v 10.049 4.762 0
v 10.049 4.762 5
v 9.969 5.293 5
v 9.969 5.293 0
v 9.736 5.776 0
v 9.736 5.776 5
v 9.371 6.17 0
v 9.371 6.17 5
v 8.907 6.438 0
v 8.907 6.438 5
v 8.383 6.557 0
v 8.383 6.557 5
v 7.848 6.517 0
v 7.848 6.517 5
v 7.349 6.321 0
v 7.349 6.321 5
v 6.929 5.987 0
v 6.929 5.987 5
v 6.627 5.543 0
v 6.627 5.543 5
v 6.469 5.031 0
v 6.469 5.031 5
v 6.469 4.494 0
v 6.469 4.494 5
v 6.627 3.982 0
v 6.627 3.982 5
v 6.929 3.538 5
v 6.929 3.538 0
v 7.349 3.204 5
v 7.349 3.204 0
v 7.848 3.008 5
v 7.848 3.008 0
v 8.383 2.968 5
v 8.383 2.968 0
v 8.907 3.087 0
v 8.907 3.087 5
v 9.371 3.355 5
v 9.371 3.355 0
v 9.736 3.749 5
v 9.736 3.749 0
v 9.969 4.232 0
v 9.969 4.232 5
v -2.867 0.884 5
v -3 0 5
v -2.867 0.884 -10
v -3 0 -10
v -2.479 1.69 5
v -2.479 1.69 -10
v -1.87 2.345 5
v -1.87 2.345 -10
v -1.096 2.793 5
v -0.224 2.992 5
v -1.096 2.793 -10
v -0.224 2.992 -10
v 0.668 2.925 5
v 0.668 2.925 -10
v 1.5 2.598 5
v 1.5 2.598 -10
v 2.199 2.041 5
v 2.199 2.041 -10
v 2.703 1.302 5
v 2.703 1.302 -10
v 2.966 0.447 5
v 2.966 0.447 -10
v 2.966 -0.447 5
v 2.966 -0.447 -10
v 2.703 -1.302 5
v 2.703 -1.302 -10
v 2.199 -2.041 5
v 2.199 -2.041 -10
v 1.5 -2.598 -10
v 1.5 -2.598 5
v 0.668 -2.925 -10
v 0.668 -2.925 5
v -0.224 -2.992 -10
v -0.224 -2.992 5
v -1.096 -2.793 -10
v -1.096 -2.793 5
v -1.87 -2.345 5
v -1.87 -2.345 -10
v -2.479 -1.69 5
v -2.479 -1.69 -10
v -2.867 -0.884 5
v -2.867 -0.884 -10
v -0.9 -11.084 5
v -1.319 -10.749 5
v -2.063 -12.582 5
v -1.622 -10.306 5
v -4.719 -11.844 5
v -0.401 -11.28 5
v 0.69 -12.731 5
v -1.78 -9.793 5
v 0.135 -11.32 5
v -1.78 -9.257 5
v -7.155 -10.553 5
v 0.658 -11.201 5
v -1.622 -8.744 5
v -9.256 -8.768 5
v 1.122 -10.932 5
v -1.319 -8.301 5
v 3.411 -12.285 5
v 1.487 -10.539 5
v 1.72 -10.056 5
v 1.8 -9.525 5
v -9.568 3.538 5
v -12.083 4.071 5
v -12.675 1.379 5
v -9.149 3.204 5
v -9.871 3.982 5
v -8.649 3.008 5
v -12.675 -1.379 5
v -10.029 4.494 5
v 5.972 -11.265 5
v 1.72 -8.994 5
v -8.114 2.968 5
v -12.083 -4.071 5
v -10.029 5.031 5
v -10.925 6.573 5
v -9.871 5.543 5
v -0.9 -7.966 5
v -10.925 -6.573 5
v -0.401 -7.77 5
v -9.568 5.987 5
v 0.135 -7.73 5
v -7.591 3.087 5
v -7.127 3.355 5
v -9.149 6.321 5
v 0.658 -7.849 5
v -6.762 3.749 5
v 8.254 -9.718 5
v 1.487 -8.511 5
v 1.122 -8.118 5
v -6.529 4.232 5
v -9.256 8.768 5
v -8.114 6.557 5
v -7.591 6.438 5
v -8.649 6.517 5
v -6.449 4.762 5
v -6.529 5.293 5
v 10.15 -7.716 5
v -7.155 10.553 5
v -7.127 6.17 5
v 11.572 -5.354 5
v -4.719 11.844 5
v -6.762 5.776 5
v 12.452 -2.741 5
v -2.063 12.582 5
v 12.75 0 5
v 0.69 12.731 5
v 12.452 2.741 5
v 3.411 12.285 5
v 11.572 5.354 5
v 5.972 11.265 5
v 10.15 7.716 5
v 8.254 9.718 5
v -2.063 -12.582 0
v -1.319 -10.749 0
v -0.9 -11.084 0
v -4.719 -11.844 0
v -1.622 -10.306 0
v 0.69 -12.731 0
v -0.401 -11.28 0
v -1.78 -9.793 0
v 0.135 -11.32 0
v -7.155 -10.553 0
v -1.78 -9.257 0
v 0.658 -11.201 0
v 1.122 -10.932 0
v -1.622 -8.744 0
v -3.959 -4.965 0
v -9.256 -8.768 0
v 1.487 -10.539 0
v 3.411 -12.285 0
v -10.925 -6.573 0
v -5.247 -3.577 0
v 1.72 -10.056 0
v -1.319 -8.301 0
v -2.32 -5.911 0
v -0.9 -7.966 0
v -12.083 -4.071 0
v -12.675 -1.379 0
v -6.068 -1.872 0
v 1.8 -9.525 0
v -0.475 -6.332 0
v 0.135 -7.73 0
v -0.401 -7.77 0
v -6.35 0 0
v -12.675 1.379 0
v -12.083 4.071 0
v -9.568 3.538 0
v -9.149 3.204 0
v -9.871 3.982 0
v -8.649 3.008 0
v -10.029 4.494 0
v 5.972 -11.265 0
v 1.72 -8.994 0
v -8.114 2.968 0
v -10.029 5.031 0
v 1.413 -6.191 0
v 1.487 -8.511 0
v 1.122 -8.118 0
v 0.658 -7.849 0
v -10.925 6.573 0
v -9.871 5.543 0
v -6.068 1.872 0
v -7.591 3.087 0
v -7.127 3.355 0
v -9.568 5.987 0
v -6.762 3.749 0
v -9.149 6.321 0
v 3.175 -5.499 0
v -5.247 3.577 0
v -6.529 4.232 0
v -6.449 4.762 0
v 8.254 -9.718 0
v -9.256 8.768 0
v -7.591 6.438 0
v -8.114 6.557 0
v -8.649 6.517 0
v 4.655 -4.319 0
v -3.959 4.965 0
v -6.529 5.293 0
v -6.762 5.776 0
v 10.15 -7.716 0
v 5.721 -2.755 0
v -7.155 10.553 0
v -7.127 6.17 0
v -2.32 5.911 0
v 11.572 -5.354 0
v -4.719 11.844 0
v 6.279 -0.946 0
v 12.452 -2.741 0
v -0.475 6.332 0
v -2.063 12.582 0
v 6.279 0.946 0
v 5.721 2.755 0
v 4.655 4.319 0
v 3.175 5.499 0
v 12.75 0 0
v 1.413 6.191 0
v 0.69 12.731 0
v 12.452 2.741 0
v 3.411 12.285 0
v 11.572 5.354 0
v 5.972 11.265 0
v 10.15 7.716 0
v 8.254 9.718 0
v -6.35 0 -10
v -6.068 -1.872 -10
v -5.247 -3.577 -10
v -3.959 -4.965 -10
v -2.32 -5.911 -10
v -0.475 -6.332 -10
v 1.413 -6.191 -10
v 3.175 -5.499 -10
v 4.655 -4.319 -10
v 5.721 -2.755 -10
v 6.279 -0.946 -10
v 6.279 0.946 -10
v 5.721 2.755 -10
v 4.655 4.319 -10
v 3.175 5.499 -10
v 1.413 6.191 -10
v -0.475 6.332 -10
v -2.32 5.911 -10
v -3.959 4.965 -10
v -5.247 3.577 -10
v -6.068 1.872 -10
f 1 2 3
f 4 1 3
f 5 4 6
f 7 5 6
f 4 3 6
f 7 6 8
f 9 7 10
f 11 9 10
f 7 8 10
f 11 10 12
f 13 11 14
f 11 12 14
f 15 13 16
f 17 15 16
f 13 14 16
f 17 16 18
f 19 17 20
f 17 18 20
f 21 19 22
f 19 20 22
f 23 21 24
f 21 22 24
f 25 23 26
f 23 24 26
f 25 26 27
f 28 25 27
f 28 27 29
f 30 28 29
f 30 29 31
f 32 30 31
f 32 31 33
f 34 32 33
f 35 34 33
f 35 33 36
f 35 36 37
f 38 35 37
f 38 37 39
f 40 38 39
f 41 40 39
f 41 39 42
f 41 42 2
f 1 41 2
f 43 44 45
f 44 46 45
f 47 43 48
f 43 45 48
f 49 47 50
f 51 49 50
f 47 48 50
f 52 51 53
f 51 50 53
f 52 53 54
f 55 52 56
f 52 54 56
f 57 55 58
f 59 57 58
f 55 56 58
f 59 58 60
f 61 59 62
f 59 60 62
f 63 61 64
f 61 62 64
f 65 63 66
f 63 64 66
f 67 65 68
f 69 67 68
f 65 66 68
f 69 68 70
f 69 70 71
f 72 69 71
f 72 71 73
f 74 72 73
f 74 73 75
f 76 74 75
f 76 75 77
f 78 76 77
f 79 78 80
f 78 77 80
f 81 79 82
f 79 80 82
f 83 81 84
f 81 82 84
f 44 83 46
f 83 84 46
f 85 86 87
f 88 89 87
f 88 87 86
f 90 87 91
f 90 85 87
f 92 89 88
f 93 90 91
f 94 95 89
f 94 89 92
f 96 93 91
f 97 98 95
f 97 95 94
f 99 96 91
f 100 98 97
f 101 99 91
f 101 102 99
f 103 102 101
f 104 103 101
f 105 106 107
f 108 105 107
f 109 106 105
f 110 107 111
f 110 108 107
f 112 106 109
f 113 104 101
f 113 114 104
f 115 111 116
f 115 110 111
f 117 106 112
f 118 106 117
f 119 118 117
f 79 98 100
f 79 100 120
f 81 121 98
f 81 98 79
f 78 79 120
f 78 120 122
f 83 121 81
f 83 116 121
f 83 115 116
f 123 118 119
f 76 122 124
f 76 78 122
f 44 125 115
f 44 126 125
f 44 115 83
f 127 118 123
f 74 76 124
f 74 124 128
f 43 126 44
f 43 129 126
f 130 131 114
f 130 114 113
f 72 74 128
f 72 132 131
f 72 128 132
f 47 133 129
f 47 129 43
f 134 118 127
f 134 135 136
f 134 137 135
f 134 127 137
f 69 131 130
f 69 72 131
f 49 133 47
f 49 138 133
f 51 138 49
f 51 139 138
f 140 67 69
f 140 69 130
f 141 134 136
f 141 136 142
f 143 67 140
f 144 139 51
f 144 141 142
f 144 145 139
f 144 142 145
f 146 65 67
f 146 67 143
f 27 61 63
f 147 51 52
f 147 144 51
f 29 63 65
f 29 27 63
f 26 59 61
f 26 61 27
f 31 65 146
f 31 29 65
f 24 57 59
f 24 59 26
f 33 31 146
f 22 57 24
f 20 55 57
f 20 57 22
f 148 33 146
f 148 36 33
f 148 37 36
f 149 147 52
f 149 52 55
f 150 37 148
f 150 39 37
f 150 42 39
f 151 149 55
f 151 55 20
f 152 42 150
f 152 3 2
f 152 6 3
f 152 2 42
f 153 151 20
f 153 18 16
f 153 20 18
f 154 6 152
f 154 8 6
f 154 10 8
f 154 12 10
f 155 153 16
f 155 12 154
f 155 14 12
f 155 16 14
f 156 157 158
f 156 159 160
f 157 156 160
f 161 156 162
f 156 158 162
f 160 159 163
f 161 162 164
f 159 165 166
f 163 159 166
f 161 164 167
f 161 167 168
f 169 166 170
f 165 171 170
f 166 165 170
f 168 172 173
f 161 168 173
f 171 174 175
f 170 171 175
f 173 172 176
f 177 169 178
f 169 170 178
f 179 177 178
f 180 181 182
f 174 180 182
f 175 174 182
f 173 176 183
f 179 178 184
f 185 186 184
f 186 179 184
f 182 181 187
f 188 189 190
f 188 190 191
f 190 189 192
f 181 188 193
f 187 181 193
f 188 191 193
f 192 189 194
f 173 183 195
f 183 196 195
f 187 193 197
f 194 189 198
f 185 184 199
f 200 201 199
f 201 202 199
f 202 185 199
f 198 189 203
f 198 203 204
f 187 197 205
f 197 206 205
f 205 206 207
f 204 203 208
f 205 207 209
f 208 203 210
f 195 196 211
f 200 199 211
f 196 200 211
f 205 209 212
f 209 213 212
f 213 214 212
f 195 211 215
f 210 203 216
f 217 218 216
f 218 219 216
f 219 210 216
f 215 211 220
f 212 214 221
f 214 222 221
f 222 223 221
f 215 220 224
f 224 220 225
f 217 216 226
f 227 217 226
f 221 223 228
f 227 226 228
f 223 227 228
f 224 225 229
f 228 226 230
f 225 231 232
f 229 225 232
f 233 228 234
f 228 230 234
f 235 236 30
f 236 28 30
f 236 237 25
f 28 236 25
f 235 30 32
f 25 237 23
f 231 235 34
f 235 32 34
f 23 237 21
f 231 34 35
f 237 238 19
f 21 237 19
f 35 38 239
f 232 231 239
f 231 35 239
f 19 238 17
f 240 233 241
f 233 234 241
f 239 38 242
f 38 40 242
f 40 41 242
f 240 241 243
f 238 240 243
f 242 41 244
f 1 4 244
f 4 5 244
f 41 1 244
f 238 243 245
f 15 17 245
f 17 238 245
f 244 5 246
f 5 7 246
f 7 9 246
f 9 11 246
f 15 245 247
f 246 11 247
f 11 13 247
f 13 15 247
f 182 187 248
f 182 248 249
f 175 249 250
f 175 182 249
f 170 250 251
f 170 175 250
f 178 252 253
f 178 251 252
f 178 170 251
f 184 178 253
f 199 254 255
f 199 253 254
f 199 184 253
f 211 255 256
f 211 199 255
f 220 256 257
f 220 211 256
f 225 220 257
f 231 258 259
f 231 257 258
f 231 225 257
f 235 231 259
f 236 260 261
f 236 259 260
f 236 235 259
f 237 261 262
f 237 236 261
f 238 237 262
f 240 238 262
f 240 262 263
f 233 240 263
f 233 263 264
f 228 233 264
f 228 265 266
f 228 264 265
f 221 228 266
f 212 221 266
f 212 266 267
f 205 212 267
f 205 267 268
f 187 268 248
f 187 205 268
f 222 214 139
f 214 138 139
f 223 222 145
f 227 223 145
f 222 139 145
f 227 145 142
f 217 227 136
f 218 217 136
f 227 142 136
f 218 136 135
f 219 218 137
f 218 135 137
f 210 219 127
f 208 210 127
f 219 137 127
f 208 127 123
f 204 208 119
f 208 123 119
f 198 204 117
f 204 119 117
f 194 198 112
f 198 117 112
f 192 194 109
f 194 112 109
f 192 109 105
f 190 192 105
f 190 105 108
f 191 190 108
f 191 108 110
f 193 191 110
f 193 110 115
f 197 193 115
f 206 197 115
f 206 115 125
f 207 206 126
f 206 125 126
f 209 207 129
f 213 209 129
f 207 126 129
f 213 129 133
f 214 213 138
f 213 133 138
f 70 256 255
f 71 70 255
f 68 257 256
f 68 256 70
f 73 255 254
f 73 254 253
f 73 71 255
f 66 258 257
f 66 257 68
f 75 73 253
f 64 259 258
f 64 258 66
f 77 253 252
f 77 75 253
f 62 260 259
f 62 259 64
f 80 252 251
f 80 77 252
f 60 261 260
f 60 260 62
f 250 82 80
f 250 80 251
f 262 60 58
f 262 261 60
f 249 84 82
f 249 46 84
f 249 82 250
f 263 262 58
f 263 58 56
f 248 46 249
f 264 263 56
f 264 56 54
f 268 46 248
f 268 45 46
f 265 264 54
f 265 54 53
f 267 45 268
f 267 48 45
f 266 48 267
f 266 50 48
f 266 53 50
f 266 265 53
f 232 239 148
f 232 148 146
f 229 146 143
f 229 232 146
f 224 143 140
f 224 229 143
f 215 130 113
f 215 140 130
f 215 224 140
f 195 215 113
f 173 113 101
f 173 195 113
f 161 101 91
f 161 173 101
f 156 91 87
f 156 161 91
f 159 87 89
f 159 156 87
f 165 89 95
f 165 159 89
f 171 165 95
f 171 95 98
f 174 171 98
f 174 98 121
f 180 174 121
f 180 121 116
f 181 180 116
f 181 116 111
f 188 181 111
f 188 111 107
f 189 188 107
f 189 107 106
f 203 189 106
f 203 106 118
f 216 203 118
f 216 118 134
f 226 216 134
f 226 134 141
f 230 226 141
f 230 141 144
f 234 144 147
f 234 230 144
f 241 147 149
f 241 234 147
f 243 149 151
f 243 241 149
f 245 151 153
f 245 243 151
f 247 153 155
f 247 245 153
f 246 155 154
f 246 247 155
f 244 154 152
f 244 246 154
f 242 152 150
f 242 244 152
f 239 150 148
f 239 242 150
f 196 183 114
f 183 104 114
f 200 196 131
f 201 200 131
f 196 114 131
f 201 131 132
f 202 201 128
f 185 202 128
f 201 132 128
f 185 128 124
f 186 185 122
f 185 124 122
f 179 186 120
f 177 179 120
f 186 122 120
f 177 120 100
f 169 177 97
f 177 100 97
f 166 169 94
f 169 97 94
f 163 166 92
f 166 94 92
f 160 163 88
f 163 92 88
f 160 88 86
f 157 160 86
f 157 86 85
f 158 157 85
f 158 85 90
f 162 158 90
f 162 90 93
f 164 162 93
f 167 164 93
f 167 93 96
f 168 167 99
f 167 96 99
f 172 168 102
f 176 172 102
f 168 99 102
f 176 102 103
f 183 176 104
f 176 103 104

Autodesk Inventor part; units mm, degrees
ref_plane "YZ Plane" through (0, 0, 0) normal (1, 0, 0) x (0, 1, 0)
ref_plane "XZ Plane" through (0, 0, 0) normal (0, 1, 0) x (-1, 0, 0)
ref_plane "XY Plane" through (0, 0, 0) normal (0, 0, 1) x (1, 0, 0)
sketch "Sketch1" plane through (0, 0, 0) normal (0, 0, 1) x (1, 0, 0)
  line L0 (-17.85, 0) -> (17.85, 0) construction
  line L1 (0, -17.85) -> (0, 17.85) construction
  circle A0 centre (0, 0) radius 12.75
  dimension "d0" = 25.5
extrude "Extrusion1" add sketch "Sketch1" along normal blind 5
sketch "Sketch2" plane through (0, 0, 0) normal (0, 0, -1) x (-1, 0, 0)
  circle A0 centre (0, 0) radius 6.35
  dimension "d3" = 12.7
extrude "Extrusion2" add sketch "Sketch2" along normal blind 10
sketch "Sketch3" plane through (0, 0, -10) normal (0, 0, -1) x (-1, 0, 0)
  circle A0 centre (0, 0) radius 3
  dimension "d6" = 6
extrude "Extrusion3" cut sketch "Sketch3" against normal through all
sketch "Sketch5" plane through (0, 0, 5) normal (0, 0, 1) x (1, 0, 0)
  circle A0 centre (0, 0) radius 9.525 construction
  circle A1 centre (0, -9.525) radius 1.8
  line L0 (-17.85, 0) -> (17.85, 0) construction
  line L1 (0, -17.85) -> (0, 17.85) construction
  circle A2 centre (8.2489, 4.7625) radius 1.8
  circle A3 centre (-8.2489, 4.7625) radius 1.8
  dimension "d13" = 19.05
  dimension "d14" = 3.6
  dimension "d19" = 360
extrude "Extrusion5" cut sketch "Sketch5" against normal through all
properties part number "Nakretka_prowadnica_tloka"
